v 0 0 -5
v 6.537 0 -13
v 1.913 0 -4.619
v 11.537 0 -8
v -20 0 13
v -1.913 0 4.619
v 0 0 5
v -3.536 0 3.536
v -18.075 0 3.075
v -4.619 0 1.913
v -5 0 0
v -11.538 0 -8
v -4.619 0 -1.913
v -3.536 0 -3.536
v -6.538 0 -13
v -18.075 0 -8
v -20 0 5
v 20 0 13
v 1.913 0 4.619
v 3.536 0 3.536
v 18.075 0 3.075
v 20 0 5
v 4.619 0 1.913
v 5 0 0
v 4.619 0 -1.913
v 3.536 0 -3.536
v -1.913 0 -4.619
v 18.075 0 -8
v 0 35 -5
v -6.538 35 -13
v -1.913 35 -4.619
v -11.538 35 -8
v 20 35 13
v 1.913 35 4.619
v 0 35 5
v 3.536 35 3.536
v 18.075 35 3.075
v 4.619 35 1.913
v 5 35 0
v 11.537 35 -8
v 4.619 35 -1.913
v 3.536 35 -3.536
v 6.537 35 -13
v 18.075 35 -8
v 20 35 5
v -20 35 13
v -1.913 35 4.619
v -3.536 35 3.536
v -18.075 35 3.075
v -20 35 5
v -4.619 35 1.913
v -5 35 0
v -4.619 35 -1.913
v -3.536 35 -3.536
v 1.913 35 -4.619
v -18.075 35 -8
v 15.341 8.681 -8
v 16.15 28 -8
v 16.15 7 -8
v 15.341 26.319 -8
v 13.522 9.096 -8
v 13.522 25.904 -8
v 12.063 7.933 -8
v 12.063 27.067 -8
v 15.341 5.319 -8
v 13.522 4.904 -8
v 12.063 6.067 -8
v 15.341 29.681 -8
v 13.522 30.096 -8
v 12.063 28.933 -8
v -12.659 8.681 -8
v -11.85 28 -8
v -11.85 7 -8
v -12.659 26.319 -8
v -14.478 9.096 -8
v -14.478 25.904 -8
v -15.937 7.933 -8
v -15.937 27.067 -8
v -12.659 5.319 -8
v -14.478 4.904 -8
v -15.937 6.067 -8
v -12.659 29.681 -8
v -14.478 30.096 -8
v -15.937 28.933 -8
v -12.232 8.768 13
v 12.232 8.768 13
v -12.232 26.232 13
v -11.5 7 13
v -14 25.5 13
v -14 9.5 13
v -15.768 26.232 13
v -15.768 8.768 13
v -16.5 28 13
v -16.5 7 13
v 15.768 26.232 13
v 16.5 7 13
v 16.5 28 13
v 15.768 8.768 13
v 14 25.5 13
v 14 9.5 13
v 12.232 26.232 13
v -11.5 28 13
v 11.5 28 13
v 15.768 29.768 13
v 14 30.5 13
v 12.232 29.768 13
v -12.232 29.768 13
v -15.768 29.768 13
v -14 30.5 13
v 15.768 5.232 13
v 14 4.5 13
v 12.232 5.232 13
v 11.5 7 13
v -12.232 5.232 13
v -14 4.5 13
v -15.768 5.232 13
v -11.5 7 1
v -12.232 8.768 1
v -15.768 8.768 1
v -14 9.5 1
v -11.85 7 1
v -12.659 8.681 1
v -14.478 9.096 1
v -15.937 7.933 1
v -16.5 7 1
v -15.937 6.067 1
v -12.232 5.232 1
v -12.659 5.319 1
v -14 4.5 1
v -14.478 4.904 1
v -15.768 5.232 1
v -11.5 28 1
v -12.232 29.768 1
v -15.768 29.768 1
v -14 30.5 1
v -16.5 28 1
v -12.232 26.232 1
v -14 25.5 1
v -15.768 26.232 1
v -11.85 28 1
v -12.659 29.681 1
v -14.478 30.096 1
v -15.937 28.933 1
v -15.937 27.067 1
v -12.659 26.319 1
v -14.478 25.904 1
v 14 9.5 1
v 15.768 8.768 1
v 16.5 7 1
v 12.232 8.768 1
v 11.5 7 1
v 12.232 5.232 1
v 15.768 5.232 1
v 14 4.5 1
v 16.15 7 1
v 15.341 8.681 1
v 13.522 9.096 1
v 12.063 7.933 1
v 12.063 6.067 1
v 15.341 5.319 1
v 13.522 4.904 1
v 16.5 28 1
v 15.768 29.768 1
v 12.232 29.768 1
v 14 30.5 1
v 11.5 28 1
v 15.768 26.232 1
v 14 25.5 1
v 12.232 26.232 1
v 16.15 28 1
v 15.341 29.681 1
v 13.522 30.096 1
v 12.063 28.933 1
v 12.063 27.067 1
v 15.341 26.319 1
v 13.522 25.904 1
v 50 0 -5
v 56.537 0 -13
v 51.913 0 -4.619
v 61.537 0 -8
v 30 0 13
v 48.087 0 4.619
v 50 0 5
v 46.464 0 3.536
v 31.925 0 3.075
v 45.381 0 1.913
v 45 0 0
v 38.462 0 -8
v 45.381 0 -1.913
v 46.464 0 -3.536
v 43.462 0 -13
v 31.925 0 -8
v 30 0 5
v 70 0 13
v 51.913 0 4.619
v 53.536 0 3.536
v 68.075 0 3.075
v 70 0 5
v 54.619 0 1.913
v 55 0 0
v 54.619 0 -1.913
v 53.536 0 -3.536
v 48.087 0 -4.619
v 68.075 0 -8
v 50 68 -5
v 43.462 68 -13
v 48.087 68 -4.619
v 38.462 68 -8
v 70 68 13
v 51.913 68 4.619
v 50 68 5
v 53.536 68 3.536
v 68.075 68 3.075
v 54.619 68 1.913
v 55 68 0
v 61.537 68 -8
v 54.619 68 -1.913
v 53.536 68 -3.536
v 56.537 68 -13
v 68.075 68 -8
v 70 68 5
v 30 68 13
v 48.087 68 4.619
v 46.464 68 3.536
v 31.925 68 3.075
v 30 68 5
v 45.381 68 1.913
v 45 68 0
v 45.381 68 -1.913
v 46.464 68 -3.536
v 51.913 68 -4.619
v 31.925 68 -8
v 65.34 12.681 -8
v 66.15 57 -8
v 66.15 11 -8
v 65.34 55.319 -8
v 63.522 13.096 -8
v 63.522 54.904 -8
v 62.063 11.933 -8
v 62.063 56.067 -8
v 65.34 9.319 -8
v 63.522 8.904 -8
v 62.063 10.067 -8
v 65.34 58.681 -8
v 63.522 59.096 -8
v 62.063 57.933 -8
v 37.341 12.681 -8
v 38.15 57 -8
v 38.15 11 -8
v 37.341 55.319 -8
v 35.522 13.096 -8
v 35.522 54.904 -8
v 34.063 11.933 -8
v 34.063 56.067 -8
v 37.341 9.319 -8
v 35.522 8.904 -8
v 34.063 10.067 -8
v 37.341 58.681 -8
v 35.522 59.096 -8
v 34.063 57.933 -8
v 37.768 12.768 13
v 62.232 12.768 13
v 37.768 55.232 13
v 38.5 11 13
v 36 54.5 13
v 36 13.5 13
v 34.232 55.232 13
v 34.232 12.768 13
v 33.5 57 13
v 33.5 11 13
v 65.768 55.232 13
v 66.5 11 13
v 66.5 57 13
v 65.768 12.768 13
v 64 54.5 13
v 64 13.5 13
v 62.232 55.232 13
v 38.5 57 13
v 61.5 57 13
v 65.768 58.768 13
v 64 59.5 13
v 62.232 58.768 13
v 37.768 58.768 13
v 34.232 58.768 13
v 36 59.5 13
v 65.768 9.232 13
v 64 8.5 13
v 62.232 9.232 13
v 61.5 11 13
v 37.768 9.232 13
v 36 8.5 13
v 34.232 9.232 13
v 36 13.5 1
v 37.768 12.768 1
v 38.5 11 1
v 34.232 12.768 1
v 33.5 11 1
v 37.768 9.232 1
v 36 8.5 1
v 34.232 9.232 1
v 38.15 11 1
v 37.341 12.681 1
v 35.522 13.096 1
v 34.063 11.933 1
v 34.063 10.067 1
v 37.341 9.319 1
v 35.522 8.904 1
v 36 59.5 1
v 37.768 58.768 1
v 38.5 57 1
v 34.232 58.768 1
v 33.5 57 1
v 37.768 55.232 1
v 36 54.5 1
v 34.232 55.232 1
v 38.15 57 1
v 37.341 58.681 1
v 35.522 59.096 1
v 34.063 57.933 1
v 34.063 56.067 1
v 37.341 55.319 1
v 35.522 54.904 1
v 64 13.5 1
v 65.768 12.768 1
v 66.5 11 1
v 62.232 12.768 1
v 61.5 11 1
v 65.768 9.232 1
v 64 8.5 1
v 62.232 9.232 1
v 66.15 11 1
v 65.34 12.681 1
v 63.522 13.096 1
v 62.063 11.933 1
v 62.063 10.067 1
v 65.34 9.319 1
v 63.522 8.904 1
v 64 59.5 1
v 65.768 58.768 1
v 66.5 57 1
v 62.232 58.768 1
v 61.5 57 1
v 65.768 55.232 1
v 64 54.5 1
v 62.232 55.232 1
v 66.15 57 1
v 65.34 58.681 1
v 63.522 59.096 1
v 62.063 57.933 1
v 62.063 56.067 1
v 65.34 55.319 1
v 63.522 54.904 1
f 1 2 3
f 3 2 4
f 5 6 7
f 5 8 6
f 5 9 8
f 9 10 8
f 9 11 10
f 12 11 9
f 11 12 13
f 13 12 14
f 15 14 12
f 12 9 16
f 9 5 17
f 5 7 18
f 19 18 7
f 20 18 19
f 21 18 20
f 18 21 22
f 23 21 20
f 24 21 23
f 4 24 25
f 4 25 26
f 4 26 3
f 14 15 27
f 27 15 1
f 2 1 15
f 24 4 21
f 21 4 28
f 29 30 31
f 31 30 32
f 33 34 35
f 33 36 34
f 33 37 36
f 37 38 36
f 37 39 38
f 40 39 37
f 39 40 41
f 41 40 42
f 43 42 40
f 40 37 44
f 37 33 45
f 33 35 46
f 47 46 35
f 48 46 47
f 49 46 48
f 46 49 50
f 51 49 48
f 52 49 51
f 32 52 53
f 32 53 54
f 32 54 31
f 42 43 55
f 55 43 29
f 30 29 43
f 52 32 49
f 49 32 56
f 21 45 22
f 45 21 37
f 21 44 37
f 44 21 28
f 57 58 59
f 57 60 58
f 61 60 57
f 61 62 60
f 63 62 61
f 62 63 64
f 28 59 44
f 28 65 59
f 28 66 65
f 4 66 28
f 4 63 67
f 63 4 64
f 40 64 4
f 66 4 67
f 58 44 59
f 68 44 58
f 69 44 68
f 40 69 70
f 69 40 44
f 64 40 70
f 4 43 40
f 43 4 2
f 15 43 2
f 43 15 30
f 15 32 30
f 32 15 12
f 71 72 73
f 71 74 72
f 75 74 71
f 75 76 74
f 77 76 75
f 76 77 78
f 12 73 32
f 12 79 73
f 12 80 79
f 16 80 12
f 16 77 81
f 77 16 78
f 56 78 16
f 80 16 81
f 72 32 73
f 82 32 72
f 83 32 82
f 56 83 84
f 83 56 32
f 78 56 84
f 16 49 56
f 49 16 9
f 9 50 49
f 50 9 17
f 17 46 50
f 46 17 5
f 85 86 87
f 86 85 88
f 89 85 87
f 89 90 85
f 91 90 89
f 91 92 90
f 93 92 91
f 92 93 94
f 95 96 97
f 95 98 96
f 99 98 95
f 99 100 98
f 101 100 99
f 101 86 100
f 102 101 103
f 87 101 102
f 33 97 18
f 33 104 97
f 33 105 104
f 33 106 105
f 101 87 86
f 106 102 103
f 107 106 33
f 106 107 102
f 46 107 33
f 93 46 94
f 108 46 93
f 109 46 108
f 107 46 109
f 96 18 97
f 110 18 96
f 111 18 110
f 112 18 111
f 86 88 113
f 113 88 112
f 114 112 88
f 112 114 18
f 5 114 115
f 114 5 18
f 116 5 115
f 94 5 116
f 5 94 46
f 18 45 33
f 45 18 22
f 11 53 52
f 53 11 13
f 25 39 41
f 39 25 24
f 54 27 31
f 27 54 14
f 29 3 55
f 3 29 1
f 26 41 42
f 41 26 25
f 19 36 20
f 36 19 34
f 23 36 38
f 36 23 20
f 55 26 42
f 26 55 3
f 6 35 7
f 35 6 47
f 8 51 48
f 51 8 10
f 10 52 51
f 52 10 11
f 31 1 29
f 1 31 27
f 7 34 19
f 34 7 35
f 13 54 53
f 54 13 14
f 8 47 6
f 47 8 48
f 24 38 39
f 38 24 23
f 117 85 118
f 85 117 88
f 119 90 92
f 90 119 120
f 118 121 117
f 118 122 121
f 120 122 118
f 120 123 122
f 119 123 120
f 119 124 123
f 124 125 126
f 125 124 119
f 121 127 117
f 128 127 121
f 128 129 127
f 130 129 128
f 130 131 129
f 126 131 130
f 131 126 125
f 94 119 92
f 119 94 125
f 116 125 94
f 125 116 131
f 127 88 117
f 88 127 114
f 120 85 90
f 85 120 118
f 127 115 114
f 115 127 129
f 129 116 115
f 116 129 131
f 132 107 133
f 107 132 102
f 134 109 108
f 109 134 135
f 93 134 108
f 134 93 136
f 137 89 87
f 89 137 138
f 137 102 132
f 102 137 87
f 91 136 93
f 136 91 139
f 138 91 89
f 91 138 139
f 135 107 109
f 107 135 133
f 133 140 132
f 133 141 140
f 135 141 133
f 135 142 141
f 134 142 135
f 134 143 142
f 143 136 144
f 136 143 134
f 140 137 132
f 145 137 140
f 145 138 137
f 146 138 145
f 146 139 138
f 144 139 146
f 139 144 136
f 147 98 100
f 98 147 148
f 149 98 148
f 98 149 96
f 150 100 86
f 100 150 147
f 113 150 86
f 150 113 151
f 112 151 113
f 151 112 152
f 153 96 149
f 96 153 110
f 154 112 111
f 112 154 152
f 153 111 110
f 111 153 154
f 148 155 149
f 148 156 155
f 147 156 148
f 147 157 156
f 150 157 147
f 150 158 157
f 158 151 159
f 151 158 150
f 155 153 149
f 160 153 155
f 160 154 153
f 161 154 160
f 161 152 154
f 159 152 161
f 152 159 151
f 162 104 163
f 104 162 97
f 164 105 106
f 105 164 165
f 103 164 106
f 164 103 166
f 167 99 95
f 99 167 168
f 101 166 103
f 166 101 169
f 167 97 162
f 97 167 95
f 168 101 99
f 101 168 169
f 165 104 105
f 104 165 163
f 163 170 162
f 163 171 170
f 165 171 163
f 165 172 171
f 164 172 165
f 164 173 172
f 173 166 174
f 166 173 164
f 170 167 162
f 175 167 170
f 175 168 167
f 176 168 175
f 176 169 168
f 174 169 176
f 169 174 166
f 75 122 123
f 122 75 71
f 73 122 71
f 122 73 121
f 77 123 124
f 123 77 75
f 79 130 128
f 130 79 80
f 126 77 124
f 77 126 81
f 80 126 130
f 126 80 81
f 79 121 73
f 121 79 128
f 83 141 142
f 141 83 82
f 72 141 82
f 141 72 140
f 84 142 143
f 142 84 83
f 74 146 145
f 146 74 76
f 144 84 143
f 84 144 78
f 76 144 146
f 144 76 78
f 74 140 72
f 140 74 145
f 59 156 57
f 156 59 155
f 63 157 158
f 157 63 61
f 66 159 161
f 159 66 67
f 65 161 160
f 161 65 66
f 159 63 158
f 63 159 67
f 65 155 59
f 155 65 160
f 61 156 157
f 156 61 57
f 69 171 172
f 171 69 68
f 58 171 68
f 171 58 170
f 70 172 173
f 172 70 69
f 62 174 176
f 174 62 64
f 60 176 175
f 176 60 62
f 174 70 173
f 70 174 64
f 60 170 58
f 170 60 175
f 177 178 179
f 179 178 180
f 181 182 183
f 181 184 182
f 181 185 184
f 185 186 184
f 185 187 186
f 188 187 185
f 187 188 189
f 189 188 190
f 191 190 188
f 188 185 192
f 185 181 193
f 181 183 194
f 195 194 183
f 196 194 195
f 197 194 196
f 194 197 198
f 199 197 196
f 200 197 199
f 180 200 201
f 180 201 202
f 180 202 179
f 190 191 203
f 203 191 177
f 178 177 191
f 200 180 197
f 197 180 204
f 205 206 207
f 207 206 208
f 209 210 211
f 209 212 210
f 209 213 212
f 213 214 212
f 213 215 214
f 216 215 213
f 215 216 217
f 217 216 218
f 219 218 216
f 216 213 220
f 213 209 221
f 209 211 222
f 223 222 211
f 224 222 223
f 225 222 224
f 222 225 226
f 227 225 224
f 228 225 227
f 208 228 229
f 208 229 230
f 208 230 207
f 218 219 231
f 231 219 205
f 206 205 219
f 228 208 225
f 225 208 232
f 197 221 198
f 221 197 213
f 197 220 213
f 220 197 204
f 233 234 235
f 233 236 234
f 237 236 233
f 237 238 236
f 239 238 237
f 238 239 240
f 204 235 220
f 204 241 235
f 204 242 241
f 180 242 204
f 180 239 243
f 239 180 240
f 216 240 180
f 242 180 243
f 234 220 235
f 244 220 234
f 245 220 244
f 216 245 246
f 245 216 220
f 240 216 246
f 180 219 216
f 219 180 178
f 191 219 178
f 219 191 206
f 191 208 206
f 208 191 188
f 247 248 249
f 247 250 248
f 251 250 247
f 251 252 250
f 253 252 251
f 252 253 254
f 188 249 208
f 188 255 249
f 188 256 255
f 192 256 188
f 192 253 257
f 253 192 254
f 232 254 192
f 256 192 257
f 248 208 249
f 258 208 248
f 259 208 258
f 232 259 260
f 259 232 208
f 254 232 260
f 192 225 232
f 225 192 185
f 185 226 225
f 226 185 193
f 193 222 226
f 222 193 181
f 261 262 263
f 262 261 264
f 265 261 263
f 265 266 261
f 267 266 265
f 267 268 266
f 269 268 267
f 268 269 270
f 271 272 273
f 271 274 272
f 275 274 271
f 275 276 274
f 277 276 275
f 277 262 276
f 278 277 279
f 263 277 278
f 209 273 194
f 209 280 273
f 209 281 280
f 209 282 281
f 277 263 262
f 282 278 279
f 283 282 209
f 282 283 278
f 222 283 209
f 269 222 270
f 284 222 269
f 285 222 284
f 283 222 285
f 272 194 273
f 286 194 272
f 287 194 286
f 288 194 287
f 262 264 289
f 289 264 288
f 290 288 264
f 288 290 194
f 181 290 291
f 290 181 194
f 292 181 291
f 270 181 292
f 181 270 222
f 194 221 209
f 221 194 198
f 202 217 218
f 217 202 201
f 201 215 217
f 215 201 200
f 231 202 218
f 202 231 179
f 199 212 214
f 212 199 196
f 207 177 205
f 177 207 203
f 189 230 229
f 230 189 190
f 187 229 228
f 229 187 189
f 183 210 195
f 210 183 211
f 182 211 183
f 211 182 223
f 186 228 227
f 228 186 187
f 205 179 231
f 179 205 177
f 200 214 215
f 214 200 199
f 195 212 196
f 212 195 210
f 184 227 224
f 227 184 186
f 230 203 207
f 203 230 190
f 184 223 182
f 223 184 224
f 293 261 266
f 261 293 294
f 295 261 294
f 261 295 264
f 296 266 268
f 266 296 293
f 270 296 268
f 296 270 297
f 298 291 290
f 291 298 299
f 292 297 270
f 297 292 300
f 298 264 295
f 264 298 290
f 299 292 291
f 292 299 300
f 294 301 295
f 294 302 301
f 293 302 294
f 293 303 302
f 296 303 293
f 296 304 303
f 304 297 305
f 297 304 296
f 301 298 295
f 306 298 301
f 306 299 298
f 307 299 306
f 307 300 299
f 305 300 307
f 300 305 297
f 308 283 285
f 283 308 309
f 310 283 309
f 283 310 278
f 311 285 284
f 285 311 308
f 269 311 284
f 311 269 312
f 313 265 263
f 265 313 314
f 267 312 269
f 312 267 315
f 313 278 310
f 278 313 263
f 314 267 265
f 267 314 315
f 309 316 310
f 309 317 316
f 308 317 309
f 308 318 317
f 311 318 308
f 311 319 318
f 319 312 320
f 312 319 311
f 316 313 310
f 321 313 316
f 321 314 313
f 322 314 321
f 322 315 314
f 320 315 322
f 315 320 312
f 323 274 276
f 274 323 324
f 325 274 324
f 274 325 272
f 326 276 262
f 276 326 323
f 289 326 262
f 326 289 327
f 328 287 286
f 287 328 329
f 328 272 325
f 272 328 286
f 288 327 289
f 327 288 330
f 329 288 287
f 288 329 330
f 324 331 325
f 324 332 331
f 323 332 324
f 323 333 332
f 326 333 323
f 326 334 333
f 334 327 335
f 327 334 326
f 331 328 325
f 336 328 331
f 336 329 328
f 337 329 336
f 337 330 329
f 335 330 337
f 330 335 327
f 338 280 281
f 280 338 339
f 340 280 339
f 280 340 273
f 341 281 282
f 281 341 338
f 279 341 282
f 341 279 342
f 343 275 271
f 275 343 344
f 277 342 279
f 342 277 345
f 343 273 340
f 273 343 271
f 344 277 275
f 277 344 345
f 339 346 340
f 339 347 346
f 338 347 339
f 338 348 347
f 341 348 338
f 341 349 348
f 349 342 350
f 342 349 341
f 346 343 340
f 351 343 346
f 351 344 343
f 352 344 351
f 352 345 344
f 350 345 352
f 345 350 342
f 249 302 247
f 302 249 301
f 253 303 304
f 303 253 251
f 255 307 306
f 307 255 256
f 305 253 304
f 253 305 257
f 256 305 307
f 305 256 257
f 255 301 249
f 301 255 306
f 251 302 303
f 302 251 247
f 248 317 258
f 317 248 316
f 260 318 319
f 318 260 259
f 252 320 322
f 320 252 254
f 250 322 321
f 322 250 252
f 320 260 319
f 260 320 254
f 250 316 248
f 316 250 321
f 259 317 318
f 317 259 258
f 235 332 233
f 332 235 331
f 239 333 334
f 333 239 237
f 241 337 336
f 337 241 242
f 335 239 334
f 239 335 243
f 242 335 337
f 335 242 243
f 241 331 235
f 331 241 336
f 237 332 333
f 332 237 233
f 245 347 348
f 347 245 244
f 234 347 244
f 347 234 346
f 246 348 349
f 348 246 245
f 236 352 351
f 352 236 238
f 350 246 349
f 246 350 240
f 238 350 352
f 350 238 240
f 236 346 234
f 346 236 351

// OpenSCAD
// file: bearing_dims.scad
/*
	bore = v[0];
	outer = v[1];
	len = v[2];
	ring_space = v[3];
	ring_dia = v[4];
	ring_gap = v[5];
*/

linear_bearing_dims = [
	[3,7,10,0,7,0],
	[4,8,12,0,8,0],
	[5,10,15,10.2,9.6,1.1],
	[6,12,19,13.5,11.5,1.1],
	[8,15,24,17.5,14.3,1.1],
	[10,19,29,22,18,1.3],
	[12,21,30,23,20,1.3],
	[13,23,32,23,22,1.3],
	[16,28,37,26.5,27,1.6],
	[20,32,42,30.5,30.5,1.6],
	[25,40,59,41,38,1.85],
	[30,45,64,44.5,43,1.85],
	[35,52,70,49.5,49,2.1],
	[40,60,80,60.5,57,2.1],
	[50,80,100,74,76.5,2.6],
	[60,90,110,85,86.5,3.15],
	[80,120,140,105.5,116,4.15],
	[100,150,150,125.5,145,4.15]
];

/*
	d = v[0];
	h = v[1];
	e = v[2];
	w = v[3];		// overall width
	l = v[4];		// overall length
	f = v[5];
	g = v[6];
	b = v[7];		// screw spacing along width
	c = v[8];		// screw spacing along length
	k = v[9];
	t = v[10];
	s1 = v[11];
	s2 = v[12];
	L1 = v[13];
*/

linear_bearing_block_dims = [
	[6,9,15,30,25,18,15,20,15,5,6,4,3.4,8],
	[8,11,17,34,30,22,18,24,18,5,6,4,3.4,8],
	[10,13,20,40,35,26,21,28,21,6,8,5,4.3,12],
	[12,15,21,42,36,28,24,30.5,26,5.75,8,5,4.3,12],
	[13,15,22,44,39,30,24.5,33,26,5.5,8,5,4.3,12],
	[16,19,25,50,44,38.5,32.5,36,34,7,9,5,4.3,12],
	[20,21,27,54,50,41,35,40,40,7,11,6,5.2,12],
	[25,26,38,76,67,51.5,42,54,50,11,12,8,7,18],
	[30,30,39,78,72,59.5,49,58,58,10,15,8,7,18],
	[35,34,45,90,80,68,54,70,60,10,18,8,7,18],
	[40,40,51,102,90,78,62,80,60,11,20,10,8.7,25],
	[50,52,61,122,110,102,80,100,80,11,25,10,8.7,25],
	[60,58,66,132,122,114,94,108,90,12,30,10,10.7,25]
];

linear_bearing_long_block_dims = [
	[8,11,17,34,59,22,18,24,42,5,6,4,3.4,8],
	[10,13,20,40,68,26,21,28,46,6,8,5,4.3,12],
	[12,15,21,42,70,28,24,30.5,50,5.75,8,5,4.3,12],
	[13,15,22,44,75,30,24.5,33,50,5.5,8,5,4.3,12],
	[16,19,25,50,85,38.5,32.5,36,60,7,9,5,4.3,12],
	[20,21,27,54,96,41,35,40,70,7,11,6,5.2,12],
	[25,26,38,76,130,51.5,42,54,100,11,12,8,7,18],
	[30,30,39,78,140,59.5,49,58,110,10,15,8,7,18],
	[35,34,45,90,155,68,54,70,120,10,18,8,7,18],
	[40,40,51,102,175,78,62,80,140,11,20,10,8.7,25],
];

/*
	d = v[0];
	D = v[1];
	L = v[2];
	D1 = v[3];
	H = v[4];
	pcd = v[5];
	d1 = v[6];
	d2 = v[7];
	h = v[8];
*/

linear_bearing_round_flange_dims = [
	[6,12,19,28,5,20,3.4,6.5,3.3],
	[8,15,24,32,5,24,3.4,6.5,3.3],
	[10,19,29,40,6,29,4.5,8,4.4],
	[12,21,30,42,6,32,4.5,8,4.4],
	[13,23,32,43,6,33,4.5,8,4.4],
	[16,28,37,48,6,38,4.5,8,4.4],
	[20,32,42,54,8,43,5.5,9.5,5.4],
	[25,40,59,62,8,51,5.5,9.5,5.4],
	[30,45,64,74,10,60,6.6,11,6.5],
	[35,52,70,82,10,67,6.6,11,6.5],
	[40,60,80,96,13,78,9,14,8.6],
	[50,80,100,116,13,98,9,14,8.6],
	[60,90,110,134,18,112,11,17.5,10.6]
];

function get_dims_for_shaft_size(shaft_size, dims) = 
	dims[search(shaft_size, dims, 1, 0)[0]];
// main file
include <bearing_dims.scad>;

module draw_linear_bearing_block(v)
{
	d = v[0];
	h = v[1];
	e = v[2];
	w = v[3];
	l = v[4];
	f = v[5];
	g = v[6];
	b = v[7];
	c = v[8];
	k = v[9];
	t = v[10];
	s1 = v[11];
	s2 = v[12];
	L1 = v[13];

	st = (k - (s2 / 2)) / 2;
	t1 = t + st;
	h1 = f - g;
	p1 = (w - (2 * h1 + 2 * st)) / 4;
	c1 = (l - c) / 2;

	translate([-w/2,0,h])
	rotate([90,180,180])
	difference()
	{
		linear_extrude(height=l)
			polygon(points=[
				[0,0],[w,0],[w,t],[w-st,t1],[w-st,g],
				[w-st-p1,g],[w-st-p1-h1,f],[st+p1+h1,f],
				[st+p1,g],[st,g],[st,t1],[0,t]],
				path=[0,1,2,3,4,5,6,7,8,9,10,11]);

		translate([e,h,-0.1])
			cylinder(r=d/2, h=l+0.2, center=false);

		translate([k,L1,c1]) rotate([90,0,0])
			cylinder(r=s1/2, h=L1+0.1, center=false);
		translate([k,L1,c+c1]) rotate([90,0,0])
			cylinder(r=s1/2, h=L1+0.1, center=false);
		translate([w-k,L1,c1]) rotate([90,0,0])
			cylinder(r=s1/2, h=L1+0.1, center=false);
		translate([w-k,L1,c+c1]) rotate([90,0,0])
			cylinder(r=s1/2, h=L1+0.1, center=false);

		translate([k,g+0.1,c1]) rotate([90,0,0])
			cylinder(r=s2/2, h=g+0.1, center=false);
		translate([k,g+0.1,c+c1]) rotate([90,0,0])
			cylinder(r=s2/2, h=g+0.1, center=false);
		translate([w-k,g+0.1,c1]) rotate([90,0,0])
			cylinder(r=s2/2, h=g+0.1, center=false);
		translate([w-k,g+0.1,c+c1]) rotate([90,0,0])
			cylinder(r=s2/2, h=g+0.1, center=false);
	}
}

module linear_bearing_mount_holes(dims, depth)
{
	w = dims[3];
	l = dims[4];
	c = dims[8];
	k = dims[9];
	s2 = dims[12];

	c1 = (l - c) / 2;

	translate([k,c1,0])
		cylinder(r=s2/2, h=depth, center=false);
	translate([k,c+c1,0])
		cylinder(r=s2/2, h=depth, center=false);
	translate([w-k,c1,0])
		cylinder(r=s2/2, h=depth, center=false);
	translate([w-k,c+c1,0])
		cylinder(r=s2/2, h=depth, center=false);

}

module linear_bearing_block(shaft_size)
{
	d = get_dims_for_shaft_size(shaft_size, linear_bearing_block_dims);
	draw_linear_bearing_block(d);
}

module linear_bearing_long_block(shaft_size)
{
	d = get_dims_for_shaft_size(shaft_size, linear_bearing_long_block_dims);
	draw_linear_bearing_block(d);
}

linear_bearing_block(10);
translate([50,0,0])
	linear_bearing_long_block(10);
